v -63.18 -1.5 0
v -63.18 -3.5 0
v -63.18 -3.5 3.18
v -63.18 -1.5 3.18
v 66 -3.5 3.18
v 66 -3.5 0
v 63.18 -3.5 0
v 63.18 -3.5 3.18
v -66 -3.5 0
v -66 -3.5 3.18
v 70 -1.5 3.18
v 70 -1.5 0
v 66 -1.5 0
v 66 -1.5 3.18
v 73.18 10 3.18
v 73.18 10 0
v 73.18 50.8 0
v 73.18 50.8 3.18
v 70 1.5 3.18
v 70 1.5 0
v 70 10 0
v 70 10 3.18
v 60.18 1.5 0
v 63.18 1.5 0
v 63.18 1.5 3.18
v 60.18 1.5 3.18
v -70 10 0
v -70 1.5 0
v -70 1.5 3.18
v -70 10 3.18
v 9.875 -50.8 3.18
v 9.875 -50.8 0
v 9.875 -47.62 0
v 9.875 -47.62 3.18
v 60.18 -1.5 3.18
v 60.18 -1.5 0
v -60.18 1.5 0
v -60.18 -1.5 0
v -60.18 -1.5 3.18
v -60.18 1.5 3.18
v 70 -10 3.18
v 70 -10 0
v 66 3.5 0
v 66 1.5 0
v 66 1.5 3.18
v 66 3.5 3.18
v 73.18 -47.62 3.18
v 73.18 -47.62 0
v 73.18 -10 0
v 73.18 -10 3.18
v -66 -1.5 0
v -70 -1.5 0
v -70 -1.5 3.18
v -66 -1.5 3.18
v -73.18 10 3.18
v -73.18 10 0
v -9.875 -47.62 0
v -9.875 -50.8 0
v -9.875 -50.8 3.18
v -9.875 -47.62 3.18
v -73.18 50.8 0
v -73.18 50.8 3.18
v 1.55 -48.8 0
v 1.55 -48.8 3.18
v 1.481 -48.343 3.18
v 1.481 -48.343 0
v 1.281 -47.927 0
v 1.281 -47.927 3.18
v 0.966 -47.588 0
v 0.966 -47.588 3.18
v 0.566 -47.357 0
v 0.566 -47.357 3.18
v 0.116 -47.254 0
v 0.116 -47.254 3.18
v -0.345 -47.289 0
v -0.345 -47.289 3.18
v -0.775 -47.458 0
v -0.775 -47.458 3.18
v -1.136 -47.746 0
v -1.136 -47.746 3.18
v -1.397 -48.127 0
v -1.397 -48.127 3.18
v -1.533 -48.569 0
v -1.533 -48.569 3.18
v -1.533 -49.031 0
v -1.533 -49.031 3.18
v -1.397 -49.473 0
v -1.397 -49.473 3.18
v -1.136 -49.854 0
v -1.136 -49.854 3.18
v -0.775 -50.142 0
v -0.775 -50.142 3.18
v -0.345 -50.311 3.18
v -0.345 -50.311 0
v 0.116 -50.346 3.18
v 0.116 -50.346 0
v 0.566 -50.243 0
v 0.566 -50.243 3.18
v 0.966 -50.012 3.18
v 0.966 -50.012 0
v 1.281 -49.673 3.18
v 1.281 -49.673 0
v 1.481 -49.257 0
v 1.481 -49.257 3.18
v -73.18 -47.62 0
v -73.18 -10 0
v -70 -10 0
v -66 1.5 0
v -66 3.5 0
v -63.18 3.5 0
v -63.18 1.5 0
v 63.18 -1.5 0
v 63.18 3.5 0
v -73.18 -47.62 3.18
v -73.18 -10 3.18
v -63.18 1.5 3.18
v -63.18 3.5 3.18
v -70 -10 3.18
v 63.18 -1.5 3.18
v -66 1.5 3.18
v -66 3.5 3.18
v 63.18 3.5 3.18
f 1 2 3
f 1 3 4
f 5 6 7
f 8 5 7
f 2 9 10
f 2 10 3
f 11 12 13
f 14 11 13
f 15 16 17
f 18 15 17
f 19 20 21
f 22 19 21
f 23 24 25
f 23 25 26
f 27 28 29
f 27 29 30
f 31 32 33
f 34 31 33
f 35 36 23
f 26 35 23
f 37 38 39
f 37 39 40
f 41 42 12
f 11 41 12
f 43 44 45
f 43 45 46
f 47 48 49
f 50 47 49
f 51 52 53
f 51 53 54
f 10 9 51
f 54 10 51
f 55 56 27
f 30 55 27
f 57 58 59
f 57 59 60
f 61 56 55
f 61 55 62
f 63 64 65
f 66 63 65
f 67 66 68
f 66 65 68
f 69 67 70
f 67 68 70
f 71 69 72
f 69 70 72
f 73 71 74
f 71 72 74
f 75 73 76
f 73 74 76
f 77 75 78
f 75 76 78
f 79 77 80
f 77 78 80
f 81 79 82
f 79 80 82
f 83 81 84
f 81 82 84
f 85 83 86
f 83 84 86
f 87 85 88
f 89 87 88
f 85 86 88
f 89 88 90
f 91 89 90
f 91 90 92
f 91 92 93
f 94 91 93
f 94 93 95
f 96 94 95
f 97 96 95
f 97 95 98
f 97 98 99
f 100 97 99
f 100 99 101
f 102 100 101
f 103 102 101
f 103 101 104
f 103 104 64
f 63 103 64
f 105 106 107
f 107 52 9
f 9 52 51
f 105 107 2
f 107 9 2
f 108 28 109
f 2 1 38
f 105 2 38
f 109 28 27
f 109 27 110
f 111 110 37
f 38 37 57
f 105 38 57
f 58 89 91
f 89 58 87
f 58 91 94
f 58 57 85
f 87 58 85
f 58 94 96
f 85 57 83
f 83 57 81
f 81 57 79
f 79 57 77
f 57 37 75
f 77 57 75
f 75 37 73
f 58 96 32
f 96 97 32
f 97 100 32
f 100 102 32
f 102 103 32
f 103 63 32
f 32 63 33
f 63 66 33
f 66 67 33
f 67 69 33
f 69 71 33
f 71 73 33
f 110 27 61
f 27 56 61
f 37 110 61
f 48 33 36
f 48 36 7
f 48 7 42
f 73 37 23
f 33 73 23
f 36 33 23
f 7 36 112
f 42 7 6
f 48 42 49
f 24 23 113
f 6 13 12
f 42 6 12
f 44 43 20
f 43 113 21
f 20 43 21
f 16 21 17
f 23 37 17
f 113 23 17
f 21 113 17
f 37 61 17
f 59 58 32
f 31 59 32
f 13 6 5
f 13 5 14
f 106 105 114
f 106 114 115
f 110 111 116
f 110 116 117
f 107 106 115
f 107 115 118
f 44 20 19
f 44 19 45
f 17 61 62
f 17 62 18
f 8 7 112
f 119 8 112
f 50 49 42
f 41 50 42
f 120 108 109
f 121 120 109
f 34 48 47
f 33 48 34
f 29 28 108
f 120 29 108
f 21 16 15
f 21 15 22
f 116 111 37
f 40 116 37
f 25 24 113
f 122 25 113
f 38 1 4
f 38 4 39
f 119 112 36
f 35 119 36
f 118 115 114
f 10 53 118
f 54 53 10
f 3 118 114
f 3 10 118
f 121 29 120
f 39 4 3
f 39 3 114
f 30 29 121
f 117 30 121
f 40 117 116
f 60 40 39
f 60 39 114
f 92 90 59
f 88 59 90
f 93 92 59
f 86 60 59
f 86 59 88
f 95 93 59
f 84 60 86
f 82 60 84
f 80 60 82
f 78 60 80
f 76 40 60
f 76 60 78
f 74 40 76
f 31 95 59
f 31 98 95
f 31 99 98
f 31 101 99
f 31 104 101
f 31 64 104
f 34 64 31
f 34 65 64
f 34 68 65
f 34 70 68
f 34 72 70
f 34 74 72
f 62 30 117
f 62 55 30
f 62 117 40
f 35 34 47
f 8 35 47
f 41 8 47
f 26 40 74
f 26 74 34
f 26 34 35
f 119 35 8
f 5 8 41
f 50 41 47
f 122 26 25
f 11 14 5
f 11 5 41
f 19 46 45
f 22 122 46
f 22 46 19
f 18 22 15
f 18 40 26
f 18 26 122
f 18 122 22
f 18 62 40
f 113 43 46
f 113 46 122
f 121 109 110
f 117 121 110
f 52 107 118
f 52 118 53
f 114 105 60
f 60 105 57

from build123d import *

# Parameters (mm, degrees)
SKETCH1_W               = 146.36
SKETCH1_H               = 101.6
BOSS_EXTRUDE1_DEPTH     = 3.18
CUT_EXTRUDE1_START      = -4.18
SKETCH2_W               = 3.18
SKETCH2_H               = 20
SKETCH2_W_2             = 13
SKETCH2_H_2             = 3
SKETCH2_W_3             = 2.82
SKETCH2_H_3             = 7
CUT_EXTRUDE1_DEPTH      = 5.18
CUT_EXTRUDE2_START      = -4.18
SKETCH3_W               = 63.305
SKETCH3_H               = 3.18
CUT_EXTRUDE2_DEPTH      = 5.18
SKETCH4_R               = 1.55
CUT_EXTRUDE3_DEPTH      = 1
CUT_EXTRUDE3_DEPTH_BACK = 4.18


with BuildPart() as part:
    # Sketch1 → Boss-Extrude1 (new body)
    with BuildSketch(Plane.XY):
        Rectangle(SKETCH1_W, SKETCH1_H)
    extrude(amount=BOSS_EXTRUDE1_DEPTH)

    # Sketch2 → Cut-Extrude1 (cut)
    with BuildSketch(Plane.XY.offset(3.18).offset(CUT_EXTRUDE1_START)):
        with Locations((-71.59, 0)):
            Rectangle(SKETCH2_W, SKETCH2_H)
        with Locations((-66.68, 0)):
            Rectangle(SKETCH2_W_2, SKETCH2_H_2)
        with Locations((-64.59, 0)):
            Rectangle(SKETCH2_W_3, SKETCH2_H_3)
    cut_extrude1 = extrude(amount=CUT_EXTRUDE1_DEPTH, mode=Mode.SUBTRACT)

    # Mirror1: Cut-Extrude1 across plane
    add(cut_extrude1.mirror(Plane(origin=(0, 0, 0), x_dir=(0, 0, 1), z_dir=(1, 0, 0))), mode=Mode.SUBTRACT)

    # Sketch3 → Cut-Extrude2 (cut)
    with BuildSketch(Plane.XY.offset(3.18).offset(CUT_EXTRUDE2_START)):
        with Locations((-41.5275, -49.21)):
            Rectangle(SKETCH3_W, SKETCH3_H)
    cut_extrude2 = extrude(amount=CUT_EXTRUDE2_DEPTH, mode=Mode.SUBTRACT)

    # Mirror2: Cut-Extrude2 across plane
    add(cut_extrude2.mirror(Plane(origin=(0, 0, 0), x_dir=(0, 0, 1), z_dir=(1, 0, 0))), mode=Mode.SUBTRACT)

    # Sketch4 → Cut-Extrude3 (cut, two sides)
    with BuildSketch(Plane.XY.offset(3.18)) as cut_extrude3_sk:
        with Locations((0, -48.8)):
            Circle(SKETCH4_R)
    extrude(amount=CUT_EXTRUDE3_DEPTH, mode=Mode.SUBTRACT)
    extrude(cut_extrude3_sk.sketch, amount=-CUT_EXTRUDE3_DEPTH_BACK, mode=Mode.SUBTRACT)


solid = part.part
